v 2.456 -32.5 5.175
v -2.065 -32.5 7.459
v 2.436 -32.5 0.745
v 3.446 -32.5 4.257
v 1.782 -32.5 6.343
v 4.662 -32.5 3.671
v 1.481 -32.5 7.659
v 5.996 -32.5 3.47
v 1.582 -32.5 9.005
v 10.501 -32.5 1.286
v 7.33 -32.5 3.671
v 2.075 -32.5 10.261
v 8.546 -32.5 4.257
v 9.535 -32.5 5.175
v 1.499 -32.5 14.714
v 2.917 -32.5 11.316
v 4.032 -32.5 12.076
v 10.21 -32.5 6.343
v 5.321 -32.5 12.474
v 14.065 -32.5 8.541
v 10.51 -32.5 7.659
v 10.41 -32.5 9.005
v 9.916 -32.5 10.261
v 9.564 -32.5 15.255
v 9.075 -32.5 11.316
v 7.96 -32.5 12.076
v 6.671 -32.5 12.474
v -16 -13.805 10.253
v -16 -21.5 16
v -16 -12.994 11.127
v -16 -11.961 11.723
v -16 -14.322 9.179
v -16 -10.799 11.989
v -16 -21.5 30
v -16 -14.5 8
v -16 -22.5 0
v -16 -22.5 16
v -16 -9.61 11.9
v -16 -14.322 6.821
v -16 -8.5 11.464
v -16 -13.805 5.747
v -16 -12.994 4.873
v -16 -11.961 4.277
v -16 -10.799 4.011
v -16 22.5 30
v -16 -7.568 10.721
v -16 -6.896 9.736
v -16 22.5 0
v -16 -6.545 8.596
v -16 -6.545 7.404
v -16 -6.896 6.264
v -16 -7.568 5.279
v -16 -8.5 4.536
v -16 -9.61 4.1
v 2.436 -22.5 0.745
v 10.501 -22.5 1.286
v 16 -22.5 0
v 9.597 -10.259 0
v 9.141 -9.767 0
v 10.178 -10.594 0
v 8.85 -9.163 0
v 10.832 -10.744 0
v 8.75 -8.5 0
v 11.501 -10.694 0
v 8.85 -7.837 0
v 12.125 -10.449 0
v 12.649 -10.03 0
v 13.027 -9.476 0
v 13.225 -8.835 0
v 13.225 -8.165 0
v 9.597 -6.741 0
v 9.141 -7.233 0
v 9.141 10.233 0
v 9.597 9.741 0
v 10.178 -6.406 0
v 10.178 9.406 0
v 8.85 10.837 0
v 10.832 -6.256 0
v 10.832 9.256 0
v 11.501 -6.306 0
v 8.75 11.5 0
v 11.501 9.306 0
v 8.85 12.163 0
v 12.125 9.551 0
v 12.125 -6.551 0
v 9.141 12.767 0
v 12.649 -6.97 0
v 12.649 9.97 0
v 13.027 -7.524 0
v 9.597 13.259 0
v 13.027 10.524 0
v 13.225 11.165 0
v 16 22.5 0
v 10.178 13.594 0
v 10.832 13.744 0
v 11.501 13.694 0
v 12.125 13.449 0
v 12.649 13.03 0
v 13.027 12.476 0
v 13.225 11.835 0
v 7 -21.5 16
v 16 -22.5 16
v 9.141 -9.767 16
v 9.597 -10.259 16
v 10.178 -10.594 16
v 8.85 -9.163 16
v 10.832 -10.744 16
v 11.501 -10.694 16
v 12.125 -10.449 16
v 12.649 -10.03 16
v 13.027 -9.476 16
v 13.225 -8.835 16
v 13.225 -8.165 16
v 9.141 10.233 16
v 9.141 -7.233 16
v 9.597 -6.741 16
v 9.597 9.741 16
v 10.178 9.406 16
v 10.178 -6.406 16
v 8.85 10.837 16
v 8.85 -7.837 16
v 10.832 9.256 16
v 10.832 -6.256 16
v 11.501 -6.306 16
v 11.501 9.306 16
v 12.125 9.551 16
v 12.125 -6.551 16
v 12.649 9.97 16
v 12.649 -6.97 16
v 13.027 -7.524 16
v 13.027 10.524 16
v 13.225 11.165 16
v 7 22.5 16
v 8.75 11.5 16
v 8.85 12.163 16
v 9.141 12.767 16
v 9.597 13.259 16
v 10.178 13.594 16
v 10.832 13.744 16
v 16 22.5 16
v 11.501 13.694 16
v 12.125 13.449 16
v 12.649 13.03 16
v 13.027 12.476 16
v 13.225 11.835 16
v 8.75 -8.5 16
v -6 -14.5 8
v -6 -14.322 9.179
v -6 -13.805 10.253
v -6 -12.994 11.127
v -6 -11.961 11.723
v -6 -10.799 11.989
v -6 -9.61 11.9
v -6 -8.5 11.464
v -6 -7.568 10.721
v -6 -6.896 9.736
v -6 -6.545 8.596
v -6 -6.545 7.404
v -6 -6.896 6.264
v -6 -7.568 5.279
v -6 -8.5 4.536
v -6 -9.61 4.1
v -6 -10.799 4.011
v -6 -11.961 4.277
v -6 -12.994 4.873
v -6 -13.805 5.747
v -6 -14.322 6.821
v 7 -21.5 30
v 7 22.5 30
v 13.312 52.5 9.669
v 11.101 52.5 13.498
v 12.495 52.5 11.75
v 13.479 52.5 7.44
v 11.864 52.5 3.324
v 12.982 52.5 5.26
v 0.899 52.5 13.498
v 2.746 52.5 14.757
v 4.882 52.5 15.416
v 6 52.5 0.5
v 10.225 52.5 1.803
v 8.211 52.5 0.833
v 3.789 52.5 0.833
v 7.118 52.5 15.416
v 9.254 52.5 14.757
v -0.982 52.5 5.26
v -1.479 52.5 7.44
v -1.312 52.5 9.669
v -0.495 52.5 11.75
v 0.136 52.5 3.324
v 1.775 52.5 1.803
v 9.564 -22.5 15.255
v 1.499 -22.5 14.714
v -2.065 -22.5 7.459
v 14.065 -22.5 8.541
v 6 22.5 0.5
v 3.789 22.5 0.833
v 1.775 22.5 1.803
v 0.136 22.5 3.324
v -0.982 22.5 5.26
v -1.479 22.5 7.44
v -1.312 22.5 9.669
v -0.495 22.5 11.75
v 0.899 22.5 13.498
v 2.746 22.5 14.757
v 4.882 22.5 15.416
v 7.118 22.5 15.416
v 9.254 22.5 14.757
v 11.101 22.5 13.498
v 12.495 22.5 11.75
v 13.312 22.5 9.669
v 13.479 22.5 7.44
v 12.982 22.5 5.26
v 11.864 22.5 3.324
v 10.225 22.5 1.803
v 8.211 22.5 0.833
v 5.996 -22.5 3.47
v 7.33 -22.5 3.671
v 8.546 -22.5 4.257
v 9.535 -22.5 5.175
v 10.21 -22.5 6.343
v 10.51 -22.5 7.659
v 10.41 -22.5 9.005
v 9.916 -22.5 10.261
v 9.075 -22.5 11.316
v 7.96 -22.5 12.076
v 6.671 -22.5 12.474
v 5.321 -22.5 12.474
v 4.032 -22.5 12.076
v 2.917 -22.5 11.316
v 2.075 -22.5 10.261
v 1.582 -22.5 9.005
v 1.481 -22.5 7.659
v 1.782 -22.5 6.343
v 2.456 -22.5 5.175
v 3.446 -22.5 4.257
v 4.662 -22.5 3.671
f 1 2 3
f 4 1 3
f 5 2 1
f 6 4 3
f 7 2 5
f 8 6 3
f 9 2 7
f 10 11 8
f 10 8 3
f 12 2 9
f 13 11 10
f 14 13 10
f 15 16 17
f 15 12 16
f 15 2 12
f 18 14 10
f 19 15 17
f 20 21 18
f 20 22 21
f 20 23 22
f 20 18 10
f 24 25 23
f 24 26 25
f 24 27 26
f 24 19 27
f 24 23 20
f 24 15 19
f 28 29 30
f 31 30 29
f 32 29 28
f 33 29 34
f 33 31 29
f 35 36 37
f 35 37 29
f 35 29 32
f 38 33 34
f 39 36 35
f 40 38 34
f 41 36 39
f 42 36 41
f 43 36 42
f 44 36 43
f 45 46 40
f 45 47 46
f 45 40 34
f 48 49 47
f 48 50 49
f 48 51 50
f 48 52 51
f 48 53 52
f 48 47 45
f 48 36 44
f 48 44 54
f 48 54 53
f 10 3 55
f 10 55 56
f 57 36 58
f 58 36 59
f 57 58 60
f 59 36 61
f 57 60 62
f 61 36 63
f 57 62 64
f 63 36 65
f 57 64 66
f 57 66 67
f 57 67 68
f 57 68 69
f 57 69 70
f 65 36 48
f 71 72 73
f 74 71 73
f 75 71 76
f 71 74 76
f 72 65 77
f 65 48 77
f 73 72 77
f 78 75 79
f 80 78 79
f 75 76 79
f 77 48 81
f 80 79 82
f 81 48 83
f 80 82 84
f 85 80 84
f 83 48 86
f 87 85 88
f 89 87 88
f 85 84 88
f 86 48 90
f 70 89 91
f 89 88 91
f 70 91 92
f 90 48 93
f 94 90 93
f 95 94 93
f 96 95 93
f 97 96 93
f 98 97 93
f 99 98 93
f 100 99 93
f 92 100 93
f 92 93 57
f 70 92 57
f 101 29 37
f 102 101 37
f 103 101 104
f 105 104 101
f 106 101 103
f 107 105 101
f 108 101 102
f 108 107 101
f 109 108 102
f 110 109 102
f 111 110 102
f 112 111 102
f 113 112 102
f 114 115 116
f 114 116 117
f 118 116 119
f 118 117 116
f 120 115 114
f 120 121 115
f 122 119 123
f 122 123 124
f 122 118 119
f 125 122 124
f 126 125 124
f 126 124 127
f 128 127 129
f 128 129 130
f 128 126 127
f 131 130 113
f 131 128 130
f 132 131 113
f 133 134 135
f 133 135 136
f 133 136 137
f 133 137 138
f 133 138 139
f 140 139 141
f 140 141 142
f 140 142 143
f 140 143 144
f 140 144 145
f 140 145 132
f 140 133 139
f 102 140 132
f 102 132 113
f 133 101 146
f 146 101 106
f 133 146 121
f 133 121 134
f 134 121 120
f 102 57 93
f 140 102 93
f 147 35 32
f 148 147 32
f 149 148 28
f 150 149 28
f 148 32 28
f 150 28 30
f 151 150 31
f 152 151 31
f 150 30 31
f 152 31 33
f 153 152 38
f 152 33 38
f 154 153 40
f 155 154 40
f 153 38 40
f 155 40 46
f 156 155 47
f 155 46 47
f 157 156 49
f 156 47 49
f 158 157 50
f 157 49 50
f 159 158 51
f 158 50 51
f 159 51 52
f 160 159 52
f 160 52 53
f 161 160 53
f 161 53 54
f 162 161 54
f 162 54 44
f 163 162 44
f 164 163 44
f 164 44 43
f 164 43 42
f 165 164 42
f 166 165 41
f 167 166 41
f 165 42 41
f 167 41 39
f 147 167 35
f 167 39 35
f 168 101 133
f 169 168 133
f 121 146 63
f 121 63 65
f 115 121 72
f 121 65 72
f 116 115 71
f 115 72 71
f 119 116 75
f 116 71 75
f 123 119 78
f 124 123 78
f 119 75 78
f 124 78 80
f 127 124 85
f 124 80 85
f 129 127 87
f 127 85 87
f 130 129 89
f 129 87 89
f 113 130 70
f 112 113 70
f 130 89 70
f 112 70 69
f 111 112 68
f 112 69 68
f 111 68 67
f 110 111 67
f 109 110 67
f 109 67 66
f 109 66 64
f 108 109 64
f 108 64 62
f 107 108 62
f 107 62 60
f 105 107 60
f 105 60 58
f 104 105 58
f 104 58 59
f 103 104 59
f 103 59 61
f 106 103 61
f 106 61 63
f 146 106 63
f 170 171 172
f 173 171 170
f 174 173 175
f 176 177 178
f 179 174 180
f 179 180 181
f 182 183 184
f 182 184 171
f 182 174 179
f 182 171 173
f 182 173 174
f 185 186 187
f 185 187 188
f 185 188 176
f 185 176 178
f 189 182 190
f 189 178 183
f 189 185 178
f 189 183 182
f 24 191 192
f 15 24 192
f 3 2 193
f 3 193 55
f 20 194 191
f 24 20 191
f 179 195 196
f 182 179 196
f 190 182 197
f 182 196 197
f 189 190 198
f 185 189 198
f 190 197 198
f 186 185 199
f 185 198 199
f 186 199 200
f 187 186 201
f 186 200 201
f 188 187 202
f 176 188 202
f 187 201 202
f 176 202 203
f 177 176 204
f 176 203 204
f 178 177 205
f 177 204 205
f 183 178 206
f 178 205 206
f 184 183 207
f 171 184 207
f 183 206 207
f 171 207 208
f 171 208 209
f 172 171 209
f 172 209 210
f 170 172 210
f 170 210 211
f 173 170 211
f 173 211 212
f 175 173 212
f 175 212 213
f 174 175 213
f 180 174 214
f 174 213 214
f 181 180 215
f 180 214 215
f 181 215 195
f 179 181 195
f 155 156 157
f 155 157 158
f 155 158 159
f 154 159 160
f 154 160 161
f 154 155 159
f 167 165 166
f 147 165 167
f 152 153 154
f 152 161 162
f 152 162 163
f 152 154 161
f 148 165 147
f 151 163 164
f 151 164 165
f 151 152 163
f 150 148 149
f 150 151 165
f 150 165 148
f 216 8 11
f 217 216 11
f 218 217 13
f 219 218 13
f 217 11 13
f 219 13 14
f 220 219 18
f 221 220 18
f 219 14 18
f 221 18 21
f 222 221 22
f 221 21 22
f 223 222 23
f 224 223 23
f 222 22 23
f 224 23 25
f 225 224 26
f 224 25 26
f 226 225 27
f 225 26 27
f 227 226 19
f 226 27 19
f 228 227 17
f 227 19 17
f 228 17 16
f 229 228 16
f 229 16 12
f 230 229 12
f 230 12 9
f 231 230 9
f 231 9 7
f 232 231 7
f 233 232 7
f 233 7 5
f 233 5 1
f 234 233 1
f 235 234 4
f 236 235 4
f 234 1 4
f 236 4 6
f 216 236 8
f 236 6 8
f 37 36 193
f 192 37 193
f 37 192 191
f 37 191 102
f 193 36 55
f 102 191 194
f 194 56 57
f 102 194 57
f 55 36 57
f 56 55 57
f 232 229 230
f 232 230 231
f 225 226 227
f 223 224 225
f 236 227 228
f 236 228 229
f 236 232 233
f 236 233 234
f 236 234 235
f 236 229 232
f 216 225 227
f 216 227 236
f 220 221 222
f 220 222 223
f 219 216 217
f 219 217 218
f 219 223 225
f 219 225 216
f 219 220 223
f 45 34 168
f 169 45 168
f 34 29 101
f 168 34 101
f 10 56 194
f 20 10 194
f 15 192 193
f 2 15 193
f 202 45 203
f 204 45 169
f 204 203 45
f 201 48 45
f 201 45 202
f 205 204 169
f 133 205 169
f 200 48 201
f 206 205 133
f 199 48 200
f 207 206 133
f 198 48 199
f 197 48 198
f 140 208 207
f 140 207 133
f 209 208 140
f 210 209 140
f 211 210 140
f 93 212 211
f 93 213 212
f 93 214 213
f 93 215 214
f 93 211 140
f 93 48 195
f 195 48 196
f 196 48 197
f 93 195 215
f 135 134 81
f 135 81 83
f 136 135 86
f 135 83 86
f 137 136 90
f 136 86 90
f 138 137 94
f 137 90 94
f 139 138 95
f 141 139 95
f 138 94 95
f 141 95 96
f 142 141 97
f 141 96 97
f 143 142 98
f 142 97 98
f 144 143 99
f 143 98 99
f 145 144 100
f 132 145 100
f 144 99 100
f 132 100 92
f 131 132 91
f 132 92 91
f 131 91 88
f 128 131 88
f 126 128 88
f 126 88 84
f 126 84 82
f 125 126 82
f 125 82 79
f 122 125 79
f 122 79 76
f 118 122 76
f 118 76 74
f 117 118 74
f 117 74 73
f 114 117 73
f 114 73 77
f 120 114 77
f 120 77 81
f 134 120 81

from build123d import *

# Parameters (mm, degrees)
SKETCH_1_W          = 32
SKETCH_1_H          = 45
EXTRUDE_1_DEPTH     = 16
CUT_EXTRUDE_1_REACH = 33.91
SKETCH_2_R          = 2.25
SKETCH_3_R          = 7.5
EXTRUDE_2_DEPTH     = 30
SKETCH_4_W          = 23
SKETCH_4_H          = 44
EXTRUDE_3_DEPTH     = 14
EXTRUDE_4_DEPTH     = 10
SKETCH_6_R          = 4.527091975
CUT_EXTRUDE_2_DEPTH = 10
SKETCH_7_R          = 4
CUT_EXTRUDE_3_DEPTH = 10


with BuildPart() as part:
    # 草图1 → 凸台-拉伸1 (new body)
    with BuildSketch(Plane.XY):
        Rectangle(SKETCH_1_W, SKETCH_1_H)
    extrude(amount=EXTRUDE_1_DEPTH)

    # 草图2 → 切除-拉伸1 (cut, up to next)
    with BuildSketch(Plane(origin=(0, 0, 0), x_dir=(-1, 0, 0), z_dir=(0, 0, -1)), mode=Mode.PRIVATE) as cut_extrude_1_sk1:
        with Locations((-11, 11.5)):
            Circle(SKETCH_2_R)
    cut_extrude_1_tool1 = extrude(cut_extrude_1_sk1.sketch, amount=-CUT_EXTRUDE_1_REACH, mode=Mode.PRIVATE) & part.part
    # 草图2 → 切除-拉伸1 (cut, up to next)
    with BuildSketch(Plane(origin=(0, 0, 0), x_dir=(-1, 0, 0), z_dir=(0, 0, -1)), mode=Mode.PRIVATE) as cut_extrude_1_sk2:
        with Locations((-11, -8.5)):
            Circle(SKETCH_2_R)
    cut_extrude_1_tool2 = extrude(cut_extrude_1_sk2.sketch, amount=-CUT_EXTRUDE_1_REACH, mode=Mode.PRIVATE) & part.part
    add(cut_extrude_1_tool1.solids().sort_by_distance((11, 11.5, 0))[0], mode=Mode.SUBTRACT)
    add(cut_extrude_1_tool2.solids().sort_by_distance((11, -8.5, 0))[0], mode=Mode.SUBTRACT)

    # 草图3 → 凸台-拉伸2 (add)
    with BuildSketch(Plane(origin=(0, 22.5, 0), x_dir=(1, 0, 0), z_dir=(0, 1, 0))):
        with Locations(Location((6, -8, 0), (0, 0, 90))):
            Circle(SKETCH_3_R)
    extrude(amount=EXTRUDE_2_DEPTH)

    # 草图4 → 凸台-拉伸3 (add)
    with BuildSketch(Plane.XY.offset(16)):
        with Locations((-4.5, 0.5)):
            Rectangle(SKETCH_4_W, SKETCH_4_H)
    extrude(amount=EXTRUDE_3_DEPTH)

    # 草图5 → 凸台-拉伸4 (add)
    with BuildSketch(Plane.XZ.offset(22.5)):
        Polygon((10.501026547, 1.286275746), (14.064769031, 8.541141206), (9.563742484, 15.25486546), (1.498973453, 14.713724254), (-2.064769031, 7.458858794), (2.436257516, 0.74513454), align=None)
    extrude(amount=EXTRUDE_4_DEPTH)

    # 草图6 → 切除-拉伸2 (cut)
    with BuildSketch(Plane.XZ.offset(32.5)):
        with Locations(Location((5.995920122, 7.997264761, 0), (0, 0, 270))):
            Circle(SKETCH_6_R)
    extrude(amount=-CUT_EXTRUDE_2_DEPTH, mode=Mode.SUBTRACT)

    # 草图7 → 切除-拉伸3 (cut)
    with BuildSketch(Plane.ZY.offset(16)):
        with Locations(Location((8, -10.5, 0), (0, 0, 270))):
            Circle(SKETCH_7_R)
    extrude(amount=-CUT_EXTRUDE_3_DEPTH, mode=Mode.SUBTRACT)


solid = part.part
